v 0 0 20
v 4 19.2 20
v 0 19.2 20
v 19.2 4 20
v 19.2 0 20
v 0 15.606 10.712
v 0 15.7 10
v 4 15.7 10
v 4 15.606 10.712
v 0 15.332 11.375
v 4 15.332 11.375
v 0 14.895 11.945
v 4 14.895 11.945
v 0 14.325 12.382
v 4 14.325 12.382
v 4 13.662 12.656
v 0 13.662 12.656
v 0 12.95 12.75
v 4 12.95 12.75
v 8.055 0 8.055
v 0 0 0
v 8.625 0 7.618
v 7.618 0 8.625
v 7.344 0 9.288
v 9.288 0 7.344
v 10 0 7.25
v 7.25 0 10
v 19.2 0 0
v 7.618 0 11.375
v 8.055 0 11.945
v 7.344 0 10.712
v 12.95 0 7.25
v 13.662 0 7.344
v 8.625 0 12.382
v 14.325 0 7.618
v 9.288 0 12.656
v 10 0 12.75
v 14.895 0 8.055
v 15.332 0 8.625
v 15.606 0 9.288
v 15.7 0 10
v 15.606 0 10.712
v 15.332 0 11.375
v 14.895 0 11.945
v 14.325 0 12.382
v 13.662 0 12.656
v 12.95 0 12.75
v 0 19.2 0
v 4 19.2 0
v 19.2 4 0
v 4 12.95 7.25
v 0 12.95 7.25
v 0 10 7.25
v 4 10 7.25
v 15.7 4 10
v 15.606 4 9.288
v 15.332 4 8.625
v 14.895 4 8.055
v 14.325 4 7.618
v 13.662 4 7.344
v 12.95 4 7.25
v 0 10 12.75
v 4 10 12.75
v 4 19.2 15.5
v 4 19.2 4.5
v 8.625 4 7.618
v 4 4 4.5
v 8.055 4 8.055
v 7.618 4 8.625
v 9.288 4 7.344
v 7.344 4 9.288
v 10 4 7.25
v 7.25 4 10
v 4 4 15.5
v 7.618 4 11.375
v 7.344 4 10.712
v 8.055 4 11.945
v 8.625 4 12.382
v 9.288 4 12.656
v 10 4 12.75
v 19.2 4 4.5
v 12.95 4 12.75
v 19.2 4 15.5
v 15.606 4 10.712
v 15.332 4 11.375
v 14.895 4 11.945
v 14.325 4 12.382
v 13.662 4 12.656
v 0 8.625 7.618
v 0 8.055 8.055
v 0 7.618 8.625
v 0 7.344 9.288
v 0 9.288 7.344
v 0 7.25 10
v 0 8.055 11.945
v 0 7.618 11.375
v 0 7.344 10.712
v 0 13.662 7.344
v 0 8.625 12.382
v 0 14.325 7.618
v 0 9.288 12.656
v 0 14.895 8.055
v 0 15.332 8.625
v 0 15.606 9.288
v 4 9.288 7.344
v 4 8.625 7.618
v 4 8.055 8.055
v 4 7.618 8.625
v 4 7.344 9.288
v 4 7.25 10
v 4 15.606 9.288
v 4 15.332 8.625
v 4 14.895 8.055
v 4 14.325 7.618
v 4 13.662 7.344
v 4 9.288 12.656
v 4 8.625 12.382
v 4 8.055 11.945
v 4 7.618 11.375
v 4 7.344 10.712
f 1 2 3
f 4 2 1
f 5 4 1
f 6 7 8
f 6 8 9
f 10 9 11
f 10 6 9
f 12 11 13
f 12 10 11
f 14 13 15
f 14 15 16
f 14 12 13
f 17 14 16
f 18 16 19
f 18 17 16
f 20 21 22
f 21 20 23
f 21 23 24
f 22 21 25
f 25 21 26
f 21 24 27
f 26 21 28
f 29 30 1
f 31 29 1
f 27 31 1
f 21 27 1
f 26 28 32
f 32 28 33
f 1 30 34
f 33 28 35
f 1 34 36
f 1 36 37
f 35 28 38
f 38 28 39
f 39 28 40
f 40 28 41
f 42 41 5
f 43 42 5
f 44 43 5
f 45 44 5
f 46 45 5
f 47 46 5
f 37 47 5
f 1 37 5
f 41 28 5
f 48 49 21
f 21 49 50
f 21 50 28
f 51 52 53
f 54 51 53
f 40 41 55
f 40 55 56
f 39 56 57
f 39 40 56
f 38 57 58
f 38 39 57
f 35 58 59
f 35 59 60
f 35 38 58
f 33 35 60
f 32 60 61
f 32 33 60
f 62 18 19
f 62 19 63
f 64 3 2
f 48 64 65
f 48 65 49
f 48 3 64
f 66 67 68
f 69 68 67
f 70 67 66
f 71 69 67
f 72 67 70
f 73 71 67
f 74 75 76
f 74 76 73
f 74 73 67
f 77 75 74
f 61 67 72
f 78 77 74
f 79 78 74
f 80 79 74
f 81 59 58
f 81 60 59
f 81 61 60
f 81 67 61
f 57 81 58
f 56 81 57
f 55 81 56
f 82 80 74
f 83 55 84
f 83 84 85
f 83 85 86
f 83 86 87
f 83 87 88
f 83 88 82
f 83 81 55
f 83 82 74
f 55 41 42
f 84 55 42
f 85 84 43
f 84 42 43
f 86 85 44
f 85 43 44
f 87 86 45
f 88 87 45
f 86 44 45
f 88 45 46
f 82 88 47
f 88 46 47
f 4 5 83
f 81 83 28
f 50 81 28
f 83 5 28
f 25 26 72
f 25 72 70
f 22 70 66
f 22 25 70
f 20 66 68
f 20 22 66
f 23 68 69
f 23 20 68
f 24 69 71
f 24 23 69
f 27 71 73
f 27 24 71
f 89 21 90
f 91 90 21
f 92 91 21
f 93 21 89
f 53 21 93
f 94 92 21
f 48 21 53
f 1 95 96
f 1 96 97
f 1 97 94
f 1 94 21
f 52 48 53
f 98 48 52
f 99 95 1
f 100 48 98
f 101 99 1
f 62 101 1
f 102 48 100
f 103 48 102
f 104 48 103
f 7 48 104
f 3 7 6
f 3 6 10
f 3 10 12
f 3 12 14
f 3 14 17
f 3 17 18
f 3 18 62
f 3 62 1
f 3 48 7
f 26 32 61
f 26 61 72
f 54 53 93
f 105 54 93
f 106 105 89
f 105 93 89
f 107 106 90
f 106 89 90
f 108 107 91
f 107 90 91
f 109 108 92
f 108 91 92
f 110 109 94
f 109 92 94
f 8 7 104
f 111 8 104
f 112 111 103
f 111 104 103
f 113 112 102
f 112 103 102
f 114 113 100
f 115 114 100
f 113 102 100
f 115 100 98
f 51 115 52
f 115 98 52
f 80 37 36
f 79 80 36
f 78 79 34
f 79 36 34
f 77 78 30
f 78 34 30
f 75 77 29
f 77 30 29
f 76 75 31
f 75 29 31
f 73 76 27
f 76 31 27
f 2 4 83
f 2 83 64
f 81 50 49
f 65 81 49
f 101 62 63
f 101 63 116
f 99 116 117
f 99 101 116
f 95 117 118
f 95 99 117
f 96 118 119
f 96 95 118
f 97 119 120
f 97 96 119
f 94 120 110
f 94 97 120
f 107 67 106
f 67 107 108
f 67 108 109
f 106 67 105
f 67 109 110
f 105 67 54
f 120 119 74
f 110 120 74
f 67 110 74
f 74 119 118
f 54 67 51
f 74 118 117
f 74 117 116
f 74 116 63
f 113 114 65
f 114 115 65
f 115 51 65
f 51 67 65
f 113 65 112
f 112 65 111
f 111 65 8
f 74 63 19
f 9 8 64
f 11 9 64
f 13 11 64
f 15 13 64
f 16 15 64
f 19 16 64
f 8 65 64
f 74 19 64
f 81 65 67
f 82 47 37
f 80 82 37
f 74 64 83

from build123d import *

# Parameters (mm, degrees)
BOSS_EXTRUDE1_DEPTH = 4.5
BOSS_EXTRUDE2_DEPTH = 4


with BuildPart() as part:
    # Sketch1 → Boss-Extrude1 (new body)
    with BuildSketch(Plane.XY):
        Polygon((0, 0), (0, 19.2), (4, 19.2), (11.6, 11.6), align=None)
    extrude(amount=BOSS_EXTRUDE1_DEPTH)

    # Sketch2 → Boss-Extrude2 (add)
    with BuildSketch(Plane(origin=(0, 0, 0), x_dir=(0, 0, -1), z_dir=(1, 0, 0))):
        with BuildLine():
            Line((-4.5, 19.2), (-10, 19.2))
            Line((-10, 19.2), (-10, 15.7))
            ThreePointArc((-10, 15.7), (-8.055456352, 14.894543648), (-7.25, 12.95))
            Line((-7.25, 12.95), (-7.25, 10))
            ThreePointArc((-7.25, 10), (-8.055456352, 8.055456352), (-10, 7.25))
            Line((-10, 7.25), (-10, 0))
            Line((-10, 0), (-4.5, 0))
            Line((-4.5, 0), (-4.5, 19.2))
        make_face()
    extrude(amount=BOSS_EXTRUDE2_DEPTH)

    # Mirror3: part across plane


with BuildPart() as part_1:
    add(part.part)
    add(part.part.mirror(Plane(origin=(4, 19.2, 10), x_dir=(1, 0, 0), z_dir=(0, 0, -1))))

    # Mirror4: part across plane


with BuildPart() as part_2:
    add(part_1.part)
    add(part_1.part.mirror(Plane(origin=(0, 0, 15.5), x_dir=(0, 0, 1), z_dir=(-0.7071067811865475, 0.7071067811865477, 0))))


solid = part_2.part
